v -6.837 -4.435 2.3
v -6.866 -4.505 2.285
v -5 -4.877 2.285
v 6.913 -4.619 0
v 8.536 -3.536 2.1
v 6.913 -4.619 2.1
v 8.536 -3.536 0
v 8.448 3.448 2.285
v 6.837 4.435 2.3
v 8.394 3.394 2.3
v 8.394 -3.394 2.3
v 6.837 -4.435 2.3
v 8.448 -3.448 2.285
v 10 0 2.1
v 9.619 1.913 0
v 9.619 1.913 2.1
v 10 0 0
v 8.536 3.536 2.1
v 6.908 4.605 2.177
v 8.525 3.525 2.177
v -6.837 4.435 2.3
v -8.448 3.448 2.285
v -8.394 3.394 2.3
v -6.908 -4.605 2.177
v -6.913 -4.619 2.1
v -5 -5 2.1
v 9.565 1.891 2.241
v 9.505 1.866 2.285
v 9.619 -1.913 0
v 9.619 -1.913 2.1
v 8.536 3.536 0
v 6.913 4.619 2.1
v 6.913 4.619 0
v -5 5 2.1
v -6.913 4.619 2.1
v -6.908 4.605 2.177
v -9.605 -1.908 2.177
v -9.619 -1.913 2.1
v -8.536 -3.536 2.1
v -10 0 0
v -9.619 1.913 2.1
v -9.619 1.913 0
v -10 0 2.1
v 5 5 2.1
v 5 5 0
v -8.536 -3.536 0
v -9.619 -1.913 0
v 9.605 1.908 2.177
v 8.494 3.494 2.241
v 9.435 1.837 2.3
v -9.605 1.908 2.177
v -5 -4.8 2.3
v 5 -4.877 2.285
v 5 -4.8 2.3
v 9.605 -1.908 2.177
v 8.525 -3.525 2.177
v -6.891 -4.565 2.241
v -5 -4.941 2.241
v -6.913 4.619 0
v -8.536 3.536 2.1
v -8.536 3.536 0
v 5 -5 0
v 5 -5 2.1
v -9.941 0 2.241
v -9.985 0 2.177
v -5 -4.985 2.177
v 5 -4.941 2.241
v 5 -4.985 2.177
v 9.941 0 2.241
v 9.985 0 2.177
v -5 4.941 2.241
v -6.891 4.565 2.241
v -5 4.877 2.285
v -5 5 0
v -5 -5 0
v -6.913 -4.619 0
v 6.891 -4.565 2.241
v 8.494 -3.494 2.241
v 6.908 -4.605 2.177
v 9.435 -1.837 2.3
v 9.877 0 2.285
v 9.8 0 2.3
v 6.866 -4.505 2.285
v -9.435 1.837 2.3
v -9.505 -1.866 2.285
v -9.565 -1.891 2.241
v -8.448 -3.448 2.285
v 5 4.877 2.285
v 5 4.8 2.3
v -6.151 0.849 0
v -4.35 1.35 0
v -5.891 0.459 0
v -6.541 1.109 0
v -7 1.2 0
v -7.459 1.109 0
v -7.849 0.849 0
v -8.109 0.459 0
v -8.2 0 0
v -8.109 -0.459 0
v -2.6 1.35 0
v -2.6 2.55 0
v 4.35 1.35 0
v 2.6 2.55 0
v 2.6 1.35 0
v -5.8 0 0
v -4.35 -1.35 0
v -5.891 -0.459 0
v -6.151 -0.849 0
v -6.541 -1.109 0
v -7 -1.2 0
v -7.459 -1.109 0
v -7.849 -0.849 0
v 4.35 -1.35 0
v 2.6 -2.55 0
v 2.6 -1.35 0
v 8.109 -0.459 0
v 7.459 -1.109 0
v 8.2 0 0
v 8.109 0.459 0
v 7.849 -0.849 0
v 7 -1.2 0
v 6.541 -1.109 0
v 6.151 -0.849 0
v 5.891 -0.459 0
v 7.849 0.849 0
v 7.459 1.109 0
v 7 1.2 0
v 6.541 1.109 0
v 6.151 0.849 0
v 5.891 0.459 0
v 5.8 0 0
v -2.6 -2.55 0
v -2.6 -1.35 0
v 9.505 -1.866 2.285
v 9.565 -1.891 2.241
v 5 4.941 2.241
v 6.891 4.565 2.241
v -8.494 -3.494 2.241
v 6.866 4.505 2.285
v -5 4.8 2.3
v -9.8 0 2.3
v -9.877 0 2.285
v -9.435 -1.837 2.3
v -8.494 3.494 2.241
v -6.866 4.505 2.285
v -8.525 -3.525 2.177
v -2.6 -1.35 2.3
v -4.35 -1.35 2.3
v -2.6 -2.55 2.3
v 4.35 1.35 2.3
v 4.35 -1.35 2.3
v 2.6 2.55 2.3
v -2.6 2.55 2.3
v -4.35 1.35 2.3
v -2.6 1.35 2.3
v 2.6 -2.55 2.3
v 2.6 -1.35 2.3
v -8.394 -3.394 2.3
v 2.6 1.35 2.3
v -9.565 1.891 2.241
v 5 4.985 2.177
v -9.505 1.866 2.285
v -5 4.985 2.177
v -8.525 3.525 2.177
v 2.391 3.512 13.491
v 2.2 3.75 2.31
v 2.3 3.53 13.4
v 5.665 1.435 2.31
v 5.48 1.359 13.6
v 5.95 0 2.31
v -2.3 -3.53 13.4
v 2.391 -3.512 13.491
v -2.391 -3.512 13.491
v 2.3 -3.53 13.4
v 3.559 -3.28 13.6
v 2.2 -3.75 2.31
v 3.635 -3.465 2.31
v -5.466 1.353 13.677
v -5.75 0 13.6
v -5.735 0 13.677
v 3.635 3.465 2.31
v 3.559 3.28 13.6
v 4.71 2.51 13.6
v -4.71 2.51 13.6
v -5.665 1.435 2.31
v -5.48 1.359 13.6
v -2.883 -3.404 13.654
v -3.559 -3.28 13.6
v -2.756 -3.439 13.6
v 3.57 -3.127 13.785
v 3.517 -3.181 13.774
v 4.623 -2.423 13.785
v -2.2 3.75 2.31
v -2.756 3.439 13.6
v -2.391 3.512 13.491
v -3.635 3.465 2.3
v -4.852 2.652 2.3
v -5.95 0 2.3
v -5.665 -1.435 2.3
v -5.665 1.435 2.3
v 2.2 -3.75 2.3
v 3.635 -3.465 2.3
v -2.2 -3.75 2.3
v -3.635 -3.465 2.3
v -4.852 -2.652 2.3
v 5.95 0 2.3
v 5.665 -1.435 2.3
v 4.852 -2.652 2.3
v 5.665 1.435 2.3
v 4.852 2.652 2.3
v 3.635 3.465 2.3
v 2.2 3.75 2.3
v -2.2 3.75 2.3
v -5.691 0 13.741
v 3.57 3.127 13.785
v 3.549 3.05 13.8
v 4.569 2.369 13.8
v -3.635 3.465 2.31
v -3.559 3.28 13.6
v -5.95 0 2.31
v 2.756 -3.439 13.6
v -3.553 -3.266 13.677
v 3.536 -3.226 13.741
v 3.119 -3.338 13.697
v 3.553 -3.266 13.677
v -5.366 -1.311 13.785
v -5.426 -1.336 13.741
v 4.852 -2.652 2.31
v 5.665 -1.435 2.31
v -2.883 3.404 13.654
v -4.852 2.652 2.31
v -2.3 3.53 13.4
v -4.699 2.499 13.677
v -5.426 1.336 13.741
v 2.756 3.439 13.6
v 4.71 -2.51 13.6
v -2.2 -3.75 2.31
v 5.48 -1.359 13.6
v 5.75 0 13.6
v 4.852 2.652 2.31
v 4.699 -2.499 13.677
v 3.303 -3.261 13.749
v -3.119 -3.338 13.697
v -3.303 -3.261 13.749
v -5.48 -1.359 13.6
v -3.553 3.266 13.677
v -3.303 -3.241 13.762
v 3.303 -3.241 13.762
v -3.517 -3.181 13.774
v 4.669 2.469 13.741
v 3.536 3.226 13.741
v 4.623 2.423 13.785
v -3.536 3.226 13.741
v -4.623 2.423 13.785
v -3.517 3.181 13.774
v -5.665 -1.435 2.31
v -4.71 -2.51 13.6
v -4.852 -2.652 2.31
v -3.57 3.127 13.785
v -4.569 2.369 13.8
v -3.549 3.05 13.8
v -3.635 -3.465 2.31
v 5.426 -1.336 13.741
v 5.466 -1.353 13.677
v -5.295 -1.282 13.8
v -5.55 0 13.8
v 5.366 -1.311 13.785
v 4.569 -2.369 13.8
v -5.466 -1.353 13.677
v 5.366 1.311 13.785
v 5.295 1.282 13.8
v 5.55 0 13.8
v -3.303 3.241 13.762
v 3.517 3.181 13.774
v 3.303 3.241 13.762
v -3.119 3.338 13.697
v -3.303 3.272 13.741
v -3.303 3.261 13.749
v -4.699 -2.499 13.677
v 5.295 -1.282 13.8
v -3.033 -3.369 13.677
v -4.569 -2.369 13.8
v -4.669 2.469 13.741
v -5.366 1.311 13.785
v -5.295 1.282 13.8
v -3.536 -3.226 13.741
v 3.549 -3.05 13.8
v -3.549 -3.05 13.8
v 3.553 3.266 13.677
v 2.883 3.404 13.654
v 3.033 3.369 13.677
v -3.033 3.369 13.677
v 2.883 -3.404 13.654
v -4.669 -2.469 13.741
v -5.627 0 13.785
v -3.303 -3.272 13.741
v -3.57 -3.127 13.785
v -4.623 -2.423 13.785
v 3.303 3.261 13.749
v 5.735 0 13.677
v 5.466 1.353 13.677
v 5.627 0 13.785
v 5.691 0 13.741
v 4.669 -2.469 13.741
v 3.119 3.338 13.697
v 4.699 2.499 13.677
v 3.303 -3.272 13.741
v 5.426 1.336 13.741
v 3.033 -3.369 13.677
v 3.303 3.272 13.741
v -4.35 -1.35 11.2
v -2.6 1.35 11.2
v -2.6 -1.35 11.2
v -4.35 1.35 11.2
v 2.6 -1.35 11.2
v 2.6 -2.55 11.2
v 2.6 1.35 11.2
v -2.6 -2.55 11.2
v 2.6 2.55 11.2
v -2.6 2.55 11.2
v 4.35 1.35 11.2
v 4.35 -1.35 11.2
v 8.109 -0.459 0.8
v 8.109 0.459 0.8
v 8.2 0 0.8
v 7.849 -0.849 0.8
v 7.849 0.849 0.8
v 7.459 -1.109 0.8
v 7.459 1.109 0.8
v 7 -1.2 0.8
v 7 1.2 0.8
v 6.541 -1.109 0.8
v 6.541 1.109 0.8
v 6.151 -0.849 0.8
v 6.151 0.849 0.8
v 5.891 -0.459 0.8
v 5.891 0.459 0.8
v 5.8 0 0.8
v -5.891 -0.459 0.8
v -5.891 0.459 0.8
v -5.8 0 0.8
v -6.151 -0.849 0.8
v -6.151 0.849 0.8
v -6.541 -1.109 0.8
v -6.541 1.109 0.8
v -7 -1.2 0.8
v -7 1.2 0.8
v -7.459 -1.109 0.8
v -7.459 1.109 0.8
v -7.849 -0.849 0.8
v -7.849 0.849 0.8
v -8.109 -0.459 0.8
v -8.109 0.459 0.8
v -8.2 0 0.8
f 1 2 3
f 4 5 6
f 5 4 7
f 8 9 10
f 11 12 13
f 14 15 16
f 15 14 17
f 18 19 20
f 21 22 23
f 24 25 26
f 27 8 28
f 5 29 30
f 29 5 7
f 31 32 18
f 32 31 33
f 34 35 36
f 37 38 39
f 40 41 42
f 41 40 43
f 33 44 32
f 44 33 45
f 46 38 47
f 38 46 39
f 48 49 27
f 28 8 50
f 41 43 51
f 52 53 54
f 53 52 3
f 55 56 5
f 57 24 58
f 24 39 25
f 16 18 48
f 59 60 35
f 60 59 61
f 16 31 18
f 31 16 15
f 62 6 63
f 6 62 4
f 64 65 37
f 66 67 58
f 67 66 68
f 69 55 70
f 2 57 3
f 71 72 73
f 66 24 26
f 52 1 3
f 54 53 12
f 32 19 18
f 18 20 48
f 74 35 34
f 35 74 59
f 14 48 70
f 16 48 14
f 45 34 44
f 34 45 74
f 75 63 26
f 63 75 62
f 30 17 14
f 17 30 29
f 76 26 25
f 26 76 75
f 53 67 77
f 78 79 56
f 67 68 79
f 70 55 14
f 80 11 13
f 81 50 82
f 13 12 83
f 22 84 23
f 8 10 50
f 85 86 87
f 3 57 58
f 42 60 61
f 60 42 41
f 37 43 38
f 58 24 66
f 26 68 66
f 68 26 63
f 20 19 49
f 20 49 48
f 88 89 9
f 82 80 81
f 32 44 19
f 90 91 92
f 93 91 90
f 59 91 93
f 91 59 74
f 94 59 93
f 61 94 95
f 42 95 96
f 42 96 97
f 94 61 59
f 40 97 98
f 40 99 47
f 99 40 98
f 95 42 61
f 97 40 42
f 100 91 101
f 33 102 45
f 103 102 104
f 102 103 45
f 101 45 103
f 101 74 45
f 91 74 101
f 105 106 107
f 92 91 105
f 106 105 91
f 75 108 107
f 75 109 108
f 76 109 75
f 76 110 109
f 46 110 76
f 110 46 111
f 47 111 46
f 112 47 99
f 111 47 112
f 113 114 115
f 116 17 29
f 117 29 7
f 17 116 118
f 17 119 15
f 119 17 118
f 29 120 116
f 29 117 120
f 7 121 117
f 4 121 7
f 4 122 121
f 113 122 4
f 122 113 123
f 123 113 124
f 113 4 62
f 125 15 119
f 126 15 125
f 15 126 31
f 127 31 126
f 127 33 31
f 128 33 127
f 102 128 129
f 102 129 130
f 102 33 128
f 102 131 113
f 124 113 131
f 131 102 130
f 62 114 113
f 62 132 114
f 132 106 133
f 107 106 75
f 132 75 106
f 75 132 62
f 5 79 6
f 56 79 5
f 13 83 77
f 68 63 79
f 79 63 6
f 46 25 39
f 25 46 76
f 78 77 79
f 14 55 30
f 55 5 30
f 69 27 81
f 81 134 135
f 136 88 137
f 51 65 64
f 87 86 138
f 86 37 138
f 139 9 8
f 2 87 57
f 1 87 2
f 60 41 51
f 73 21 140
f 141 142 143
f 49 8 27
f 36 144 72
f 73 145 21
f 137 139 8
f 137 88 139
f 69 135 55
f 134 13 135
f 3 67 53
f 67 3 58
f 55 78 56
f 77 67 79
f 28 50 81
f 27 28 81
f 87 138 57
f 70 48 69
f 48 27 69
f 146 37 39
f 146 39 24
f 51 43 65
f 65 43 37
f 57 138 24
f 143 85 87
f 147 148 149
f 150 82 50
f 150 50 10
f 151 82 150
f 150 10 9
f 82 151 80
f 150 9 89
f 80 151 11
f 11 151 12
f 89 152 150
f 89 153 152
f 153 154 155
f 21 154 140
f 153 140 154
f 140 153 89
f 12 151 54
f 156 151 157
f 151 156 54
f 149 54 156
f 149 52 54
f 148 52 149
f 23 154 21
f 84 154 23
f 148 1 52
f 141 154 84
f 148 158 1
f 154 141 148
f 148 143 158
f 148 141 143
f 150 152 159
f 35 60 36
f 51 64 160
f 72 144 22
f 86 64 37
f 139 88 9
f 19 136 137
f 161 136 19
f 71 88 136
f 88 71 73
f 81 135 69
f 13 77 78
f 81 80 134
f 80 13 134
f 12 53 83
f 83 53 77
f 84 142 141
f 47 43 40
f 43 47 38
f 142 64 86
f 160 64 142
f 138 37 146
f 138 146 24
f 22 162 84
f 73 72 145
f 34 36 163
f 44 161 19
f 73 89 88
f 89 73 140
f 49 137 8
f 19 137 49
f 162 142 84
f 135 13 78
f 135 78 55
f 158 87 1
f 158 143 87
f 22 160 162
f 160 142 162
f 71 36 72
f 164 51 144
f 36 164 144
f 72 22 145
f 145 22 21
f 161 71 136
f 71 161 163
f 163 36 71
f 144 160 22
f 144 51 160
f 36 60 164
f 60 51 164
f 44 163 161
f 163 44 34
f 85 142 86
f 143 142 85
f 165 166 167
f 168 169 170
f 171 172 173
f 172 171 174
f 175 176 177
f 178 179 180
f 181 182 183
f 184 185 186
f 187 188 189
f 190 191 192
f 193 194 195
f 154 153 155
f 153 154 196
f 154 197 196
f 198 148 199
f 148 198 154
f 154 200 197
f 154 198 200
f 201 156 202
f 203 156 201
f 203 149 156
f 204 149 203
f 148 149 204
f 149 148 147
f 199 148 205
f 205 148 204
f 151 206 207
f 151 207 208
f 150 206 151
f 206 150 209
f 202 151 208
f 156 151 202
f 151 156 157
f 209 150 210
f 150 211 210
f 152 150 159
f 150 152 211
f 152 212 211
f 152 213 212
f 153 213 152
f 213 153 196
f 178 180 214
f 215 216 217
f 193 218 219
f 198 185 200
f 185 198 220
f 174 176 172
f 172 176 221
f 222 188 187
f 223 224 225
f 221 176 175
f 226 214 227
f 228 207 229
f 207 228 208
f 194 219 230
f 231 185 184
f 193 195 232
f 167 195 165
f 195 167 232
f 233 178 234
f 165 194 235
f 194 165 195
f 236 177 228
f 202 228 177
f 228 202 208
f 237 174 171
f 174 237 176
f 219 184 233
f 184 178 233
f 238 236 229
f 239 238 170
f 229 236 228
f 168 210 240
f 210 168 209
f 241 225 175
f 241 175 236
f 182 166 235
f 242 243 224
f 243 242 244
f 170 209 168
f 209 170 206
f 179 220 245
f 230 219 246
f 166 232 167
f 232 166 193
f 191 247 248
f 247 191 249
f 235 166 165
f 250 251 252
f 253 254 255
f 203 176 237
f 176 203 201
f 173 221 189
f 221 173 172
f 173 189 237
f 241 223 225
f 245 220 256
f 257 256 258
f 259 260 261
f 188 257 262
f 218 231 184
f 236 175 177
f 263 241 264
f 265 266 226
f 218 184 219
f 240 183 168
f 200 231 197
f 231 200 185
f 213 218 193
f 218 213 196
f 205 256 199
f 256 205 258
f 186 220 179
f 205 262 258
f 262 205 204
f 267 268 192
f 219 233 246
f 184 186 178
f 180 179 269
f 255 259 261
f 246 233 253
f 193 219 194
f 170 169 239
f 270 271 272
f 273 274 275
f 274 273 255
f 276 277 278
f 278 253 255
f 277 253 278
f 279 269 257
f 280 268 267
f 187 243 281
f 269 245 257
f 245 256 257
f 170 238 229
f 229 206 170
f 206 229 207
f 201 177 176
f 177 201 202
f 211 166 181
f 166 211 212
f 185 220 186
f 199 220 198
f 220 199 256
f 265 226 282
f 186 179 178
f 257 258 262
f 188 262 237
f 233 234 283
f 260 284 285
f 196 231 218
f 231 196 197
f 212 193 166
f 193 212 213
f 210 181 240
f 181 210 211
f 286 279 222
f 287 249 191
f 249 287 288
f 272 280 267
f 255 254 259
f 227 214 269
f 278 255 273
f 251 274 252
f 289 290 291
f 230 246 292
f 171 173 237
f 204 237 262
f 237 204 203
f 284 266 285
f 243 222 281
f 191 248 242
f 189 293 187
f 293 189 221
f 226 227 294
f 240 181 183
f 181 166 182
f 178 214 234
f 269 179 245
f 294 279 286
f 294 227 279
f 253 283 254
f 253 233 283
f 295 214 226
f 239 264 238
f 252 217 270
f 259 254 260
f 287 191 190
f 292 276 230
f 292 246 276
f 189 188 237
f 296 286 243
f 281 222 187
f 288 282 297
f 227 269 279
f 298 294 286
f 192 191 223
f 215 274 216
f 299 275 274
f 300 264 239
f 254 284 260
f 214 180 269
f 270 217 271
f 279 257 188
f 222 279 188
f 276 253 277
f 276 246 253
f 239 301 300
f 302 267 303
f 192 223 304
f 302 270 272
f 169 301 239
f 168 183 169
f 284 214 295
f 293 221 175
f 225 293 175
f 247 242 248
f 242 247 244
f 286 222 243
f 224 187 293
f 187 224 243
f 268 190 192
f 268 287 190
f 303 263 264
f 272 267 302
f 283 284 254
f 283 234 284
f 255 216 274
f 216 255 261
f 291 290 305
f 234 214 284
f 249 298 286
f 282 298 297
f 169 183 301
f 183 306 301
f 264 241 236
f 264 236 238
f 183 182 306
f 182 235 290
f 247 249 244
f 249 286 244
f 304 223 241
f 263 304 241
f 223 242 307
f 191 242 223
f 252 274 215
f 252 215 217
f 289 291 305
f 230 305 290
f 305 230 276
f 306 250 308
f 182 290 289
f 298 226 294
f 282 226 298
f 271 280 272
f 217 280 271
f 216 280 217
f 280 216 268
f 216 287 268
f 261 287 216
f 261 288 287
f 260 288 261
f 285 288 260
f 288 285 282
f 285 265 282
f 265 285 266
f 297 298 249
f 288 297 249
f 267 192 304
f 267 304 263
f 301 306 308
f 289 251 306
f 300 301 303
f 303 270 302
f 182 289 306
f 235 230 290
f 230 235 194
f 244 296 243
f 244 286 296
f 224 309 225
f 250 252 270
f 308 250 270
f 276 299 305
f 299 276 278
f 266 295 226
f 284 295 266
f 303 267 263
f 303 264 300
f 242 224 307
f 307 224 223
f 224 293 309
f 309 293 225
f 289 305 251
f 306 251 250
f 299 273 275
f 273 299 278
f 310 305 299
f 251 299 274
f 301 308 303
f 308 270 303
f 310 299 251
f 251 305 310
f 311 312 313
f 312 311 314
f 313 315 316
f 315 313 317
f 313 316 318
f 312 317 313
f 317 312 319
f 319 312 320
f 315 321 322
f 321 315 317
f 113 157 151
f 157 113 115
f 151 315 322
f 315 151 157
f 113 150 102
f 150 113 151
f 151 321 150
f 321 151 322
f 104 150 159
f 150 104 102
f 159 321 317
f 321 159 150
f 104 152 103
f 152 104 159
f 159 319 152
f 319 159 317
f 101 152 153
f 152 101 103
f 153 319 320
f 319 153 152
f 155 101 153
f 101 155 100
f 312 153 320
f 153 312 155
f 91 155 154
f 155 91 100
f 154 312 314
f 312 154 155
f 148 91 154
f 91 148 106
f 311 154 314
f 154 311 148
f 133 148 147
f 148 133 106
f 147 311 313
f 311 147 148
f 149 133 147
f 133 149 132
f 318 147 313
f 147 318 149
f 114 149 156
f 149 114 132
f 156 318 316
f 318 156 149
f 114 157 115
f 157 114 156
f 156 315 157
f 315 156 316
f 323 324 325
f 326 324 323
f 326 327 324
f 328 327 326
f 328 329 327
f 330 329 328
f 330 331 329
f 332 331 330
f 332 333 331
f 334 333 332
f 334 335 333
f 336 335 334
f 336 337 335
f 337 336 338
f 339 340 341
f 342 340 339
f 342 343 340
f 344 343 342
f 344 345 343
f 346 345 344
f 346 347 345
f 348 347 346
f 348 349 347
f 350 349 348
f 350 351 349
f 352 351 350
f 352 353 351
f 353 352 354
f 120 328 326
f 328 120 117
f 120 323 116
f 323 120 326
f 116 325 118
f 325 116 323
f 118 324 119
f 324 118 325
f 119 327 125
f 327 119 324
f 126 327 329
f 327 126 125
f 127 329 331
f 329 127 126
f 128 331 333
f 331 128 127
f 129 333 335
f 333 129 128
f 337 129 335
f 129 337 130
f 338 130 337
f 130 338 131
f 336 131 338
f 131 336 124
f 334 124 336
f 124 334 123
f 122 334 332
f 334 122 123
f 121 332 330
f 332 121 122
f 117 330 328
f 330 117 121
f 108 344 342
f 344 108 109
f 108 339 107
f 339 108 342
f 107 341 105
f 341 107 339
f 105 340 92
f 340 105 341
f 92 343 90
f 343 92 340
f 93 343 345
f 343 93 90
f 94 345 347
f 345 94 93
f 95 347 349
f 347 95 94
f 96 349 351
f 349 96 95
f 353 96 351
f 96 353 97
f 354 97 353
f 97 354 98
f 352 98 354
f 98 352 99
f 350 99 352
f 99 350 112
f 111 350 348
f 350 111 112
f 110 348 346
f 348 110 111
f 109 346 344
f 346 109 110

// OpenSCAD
/*
 * Selector switch cap for NES four score
 */

$fn = 16;

/*
 * Flat pill-shape with rounded top edge
 */
module pill_fillet_end(diameter, height, rounding) {
  r = diameter/2;
  cx = r - rounding;
  cy = height - rounding;


  rotate([0, 0, -90]) {
    rotate_extrude(angle=180) {

      // Rectangle with a single rounded corner
      square(size=[r, cy]);

      if (rounding > 0) {
        square(size=[cx, height]);
        translate([cx, cy, 0])
          rotate([0,0,45])
            circle(r=rounding);
      }
    };
  };
}

module flat_rounded_pill(length, diameter, height, rounding) {
  // Distance from the middle to the center of the round cap
  mid = (length/2) - (diameter/2);
  hull() {
    translate([mid,0,0])
      pill_fillet_end(diameter, height, rounding);
    translate([-mid,0,0])
      rotate([0,0,180])
        pill_fillet_end(diameter, height, rounding);
  }
}


/*
 * Brim
 */

 ss_brim_length=20;
 ss_brim_diameter=10;
 ss_brim_height=2.3;
 ss_brim_rounding=0.2;


 /*
  * Steeple
  */

ss_steeple_bot_diameter = 7.5;
ss_steeple_bot_length = 11.9;
ss_steeple_height = 11.3;
ss_steeple_top_diameter = 7.1;
ss_steeple_top_length = 11.5;
ss_steeple_narrow_rounding = 0.2;
ss_steeple_wide_rounding = 0.5;

module ss_steeple_rounding() {
  top_rect_x = ss_steeple_top_length - (ss_steeple_top_diameter);
  top_rect_y = ss_steeple_top_diameter - (ss_steeple_wide_rounding*2);

  // Cut off a wider fillet along the X axis
  translate([0, 0, -ss_steeple_wide_rounding])
  rotate([0,90,0]) {
    translate([0,top_rect_y/2, 0])
      cylinder(h=ss_steeple_top_length, r=ss_steeple_wide_rounding, center=true);
    translate([0,-top_rect_y/2, 0])
      cylinder(h=ss_steeple_top_length, r=ss_steeple_wide_rounding, center=true);

    translate([-ss_steeple_wide_rounding/2, 0, 0])
    cube([ss_steeple_wide_rounding, top_rect_y, ss_steeple_top_length], center=true);
  }
}

 module ss_steeple() {
    mid = (ss_steeple_bot_length/2) - (ss_steeple_bot_diameter/2);


    hull() {
      // Bottom of steeple
      linear_extrude(0.01) {
        translate([mid,0,0])
          circle(d=ss_steeple_bot_diameter);
        translate([-mid,0,0])
          circle(d=ss_steeple_bot_diameter);
        square([2*mid, ss_steeple_bot_diameter], center=true);
      };

      // Top of steeple
      translate([0, 0, ss_steeple_height - (ss_steeple_narrow_rounding) ])
        intersection() {
          flat_rounded_pill(ss_steeple_top_length, ss_steeple_top_diameter,
                           ss_steeple_narrow_rounding*2, ss_steeple_narrow_rounding);

          // Wider rounding along the X axis
          translate([0, 0, ss_steeple_narrow_rounding*2])
          ss_steeple_rounding();
        }
    };
 }





 /*
  * Solid body
  */
module ss_body() {
  // Brim
  flat_rounded_pill(ss_brim_length, ss_brim_diameter, ss_brim_height, ss_brim_rounding);

  // Steeple
  translate([0, 0, ss_brim_height])
    ss_steeple();
}



/*
 * Cross-shaped hole in the bottom
 */
module ss_hole() {
  linear_extrude(height=11.2) {
    square([5.2, 5.1], center=true);
    square([8.7, 2.7], center=true);
  }
}


/*
 * Little round dimples on the bottom
 */
ss_dimple_cc = 14;
ss_dimple_diameter = 2.4;

module ss_dimples() {
  mid = ss_dimple_cc / 2;

  linear_extrude(height=0.8) {
    translate([mid, 0, 0])
      circle(d=ss_dimple_diameter);
    translate([-mid, 0, 0])
      circle(d=ss_dimple_diameter);
  };
}


 // Top-level module
 module selector_switch() {
  difference() {
    ss_body();
    ss_hole();
    ss_dimples();
  }
 }



 selector_switch();
